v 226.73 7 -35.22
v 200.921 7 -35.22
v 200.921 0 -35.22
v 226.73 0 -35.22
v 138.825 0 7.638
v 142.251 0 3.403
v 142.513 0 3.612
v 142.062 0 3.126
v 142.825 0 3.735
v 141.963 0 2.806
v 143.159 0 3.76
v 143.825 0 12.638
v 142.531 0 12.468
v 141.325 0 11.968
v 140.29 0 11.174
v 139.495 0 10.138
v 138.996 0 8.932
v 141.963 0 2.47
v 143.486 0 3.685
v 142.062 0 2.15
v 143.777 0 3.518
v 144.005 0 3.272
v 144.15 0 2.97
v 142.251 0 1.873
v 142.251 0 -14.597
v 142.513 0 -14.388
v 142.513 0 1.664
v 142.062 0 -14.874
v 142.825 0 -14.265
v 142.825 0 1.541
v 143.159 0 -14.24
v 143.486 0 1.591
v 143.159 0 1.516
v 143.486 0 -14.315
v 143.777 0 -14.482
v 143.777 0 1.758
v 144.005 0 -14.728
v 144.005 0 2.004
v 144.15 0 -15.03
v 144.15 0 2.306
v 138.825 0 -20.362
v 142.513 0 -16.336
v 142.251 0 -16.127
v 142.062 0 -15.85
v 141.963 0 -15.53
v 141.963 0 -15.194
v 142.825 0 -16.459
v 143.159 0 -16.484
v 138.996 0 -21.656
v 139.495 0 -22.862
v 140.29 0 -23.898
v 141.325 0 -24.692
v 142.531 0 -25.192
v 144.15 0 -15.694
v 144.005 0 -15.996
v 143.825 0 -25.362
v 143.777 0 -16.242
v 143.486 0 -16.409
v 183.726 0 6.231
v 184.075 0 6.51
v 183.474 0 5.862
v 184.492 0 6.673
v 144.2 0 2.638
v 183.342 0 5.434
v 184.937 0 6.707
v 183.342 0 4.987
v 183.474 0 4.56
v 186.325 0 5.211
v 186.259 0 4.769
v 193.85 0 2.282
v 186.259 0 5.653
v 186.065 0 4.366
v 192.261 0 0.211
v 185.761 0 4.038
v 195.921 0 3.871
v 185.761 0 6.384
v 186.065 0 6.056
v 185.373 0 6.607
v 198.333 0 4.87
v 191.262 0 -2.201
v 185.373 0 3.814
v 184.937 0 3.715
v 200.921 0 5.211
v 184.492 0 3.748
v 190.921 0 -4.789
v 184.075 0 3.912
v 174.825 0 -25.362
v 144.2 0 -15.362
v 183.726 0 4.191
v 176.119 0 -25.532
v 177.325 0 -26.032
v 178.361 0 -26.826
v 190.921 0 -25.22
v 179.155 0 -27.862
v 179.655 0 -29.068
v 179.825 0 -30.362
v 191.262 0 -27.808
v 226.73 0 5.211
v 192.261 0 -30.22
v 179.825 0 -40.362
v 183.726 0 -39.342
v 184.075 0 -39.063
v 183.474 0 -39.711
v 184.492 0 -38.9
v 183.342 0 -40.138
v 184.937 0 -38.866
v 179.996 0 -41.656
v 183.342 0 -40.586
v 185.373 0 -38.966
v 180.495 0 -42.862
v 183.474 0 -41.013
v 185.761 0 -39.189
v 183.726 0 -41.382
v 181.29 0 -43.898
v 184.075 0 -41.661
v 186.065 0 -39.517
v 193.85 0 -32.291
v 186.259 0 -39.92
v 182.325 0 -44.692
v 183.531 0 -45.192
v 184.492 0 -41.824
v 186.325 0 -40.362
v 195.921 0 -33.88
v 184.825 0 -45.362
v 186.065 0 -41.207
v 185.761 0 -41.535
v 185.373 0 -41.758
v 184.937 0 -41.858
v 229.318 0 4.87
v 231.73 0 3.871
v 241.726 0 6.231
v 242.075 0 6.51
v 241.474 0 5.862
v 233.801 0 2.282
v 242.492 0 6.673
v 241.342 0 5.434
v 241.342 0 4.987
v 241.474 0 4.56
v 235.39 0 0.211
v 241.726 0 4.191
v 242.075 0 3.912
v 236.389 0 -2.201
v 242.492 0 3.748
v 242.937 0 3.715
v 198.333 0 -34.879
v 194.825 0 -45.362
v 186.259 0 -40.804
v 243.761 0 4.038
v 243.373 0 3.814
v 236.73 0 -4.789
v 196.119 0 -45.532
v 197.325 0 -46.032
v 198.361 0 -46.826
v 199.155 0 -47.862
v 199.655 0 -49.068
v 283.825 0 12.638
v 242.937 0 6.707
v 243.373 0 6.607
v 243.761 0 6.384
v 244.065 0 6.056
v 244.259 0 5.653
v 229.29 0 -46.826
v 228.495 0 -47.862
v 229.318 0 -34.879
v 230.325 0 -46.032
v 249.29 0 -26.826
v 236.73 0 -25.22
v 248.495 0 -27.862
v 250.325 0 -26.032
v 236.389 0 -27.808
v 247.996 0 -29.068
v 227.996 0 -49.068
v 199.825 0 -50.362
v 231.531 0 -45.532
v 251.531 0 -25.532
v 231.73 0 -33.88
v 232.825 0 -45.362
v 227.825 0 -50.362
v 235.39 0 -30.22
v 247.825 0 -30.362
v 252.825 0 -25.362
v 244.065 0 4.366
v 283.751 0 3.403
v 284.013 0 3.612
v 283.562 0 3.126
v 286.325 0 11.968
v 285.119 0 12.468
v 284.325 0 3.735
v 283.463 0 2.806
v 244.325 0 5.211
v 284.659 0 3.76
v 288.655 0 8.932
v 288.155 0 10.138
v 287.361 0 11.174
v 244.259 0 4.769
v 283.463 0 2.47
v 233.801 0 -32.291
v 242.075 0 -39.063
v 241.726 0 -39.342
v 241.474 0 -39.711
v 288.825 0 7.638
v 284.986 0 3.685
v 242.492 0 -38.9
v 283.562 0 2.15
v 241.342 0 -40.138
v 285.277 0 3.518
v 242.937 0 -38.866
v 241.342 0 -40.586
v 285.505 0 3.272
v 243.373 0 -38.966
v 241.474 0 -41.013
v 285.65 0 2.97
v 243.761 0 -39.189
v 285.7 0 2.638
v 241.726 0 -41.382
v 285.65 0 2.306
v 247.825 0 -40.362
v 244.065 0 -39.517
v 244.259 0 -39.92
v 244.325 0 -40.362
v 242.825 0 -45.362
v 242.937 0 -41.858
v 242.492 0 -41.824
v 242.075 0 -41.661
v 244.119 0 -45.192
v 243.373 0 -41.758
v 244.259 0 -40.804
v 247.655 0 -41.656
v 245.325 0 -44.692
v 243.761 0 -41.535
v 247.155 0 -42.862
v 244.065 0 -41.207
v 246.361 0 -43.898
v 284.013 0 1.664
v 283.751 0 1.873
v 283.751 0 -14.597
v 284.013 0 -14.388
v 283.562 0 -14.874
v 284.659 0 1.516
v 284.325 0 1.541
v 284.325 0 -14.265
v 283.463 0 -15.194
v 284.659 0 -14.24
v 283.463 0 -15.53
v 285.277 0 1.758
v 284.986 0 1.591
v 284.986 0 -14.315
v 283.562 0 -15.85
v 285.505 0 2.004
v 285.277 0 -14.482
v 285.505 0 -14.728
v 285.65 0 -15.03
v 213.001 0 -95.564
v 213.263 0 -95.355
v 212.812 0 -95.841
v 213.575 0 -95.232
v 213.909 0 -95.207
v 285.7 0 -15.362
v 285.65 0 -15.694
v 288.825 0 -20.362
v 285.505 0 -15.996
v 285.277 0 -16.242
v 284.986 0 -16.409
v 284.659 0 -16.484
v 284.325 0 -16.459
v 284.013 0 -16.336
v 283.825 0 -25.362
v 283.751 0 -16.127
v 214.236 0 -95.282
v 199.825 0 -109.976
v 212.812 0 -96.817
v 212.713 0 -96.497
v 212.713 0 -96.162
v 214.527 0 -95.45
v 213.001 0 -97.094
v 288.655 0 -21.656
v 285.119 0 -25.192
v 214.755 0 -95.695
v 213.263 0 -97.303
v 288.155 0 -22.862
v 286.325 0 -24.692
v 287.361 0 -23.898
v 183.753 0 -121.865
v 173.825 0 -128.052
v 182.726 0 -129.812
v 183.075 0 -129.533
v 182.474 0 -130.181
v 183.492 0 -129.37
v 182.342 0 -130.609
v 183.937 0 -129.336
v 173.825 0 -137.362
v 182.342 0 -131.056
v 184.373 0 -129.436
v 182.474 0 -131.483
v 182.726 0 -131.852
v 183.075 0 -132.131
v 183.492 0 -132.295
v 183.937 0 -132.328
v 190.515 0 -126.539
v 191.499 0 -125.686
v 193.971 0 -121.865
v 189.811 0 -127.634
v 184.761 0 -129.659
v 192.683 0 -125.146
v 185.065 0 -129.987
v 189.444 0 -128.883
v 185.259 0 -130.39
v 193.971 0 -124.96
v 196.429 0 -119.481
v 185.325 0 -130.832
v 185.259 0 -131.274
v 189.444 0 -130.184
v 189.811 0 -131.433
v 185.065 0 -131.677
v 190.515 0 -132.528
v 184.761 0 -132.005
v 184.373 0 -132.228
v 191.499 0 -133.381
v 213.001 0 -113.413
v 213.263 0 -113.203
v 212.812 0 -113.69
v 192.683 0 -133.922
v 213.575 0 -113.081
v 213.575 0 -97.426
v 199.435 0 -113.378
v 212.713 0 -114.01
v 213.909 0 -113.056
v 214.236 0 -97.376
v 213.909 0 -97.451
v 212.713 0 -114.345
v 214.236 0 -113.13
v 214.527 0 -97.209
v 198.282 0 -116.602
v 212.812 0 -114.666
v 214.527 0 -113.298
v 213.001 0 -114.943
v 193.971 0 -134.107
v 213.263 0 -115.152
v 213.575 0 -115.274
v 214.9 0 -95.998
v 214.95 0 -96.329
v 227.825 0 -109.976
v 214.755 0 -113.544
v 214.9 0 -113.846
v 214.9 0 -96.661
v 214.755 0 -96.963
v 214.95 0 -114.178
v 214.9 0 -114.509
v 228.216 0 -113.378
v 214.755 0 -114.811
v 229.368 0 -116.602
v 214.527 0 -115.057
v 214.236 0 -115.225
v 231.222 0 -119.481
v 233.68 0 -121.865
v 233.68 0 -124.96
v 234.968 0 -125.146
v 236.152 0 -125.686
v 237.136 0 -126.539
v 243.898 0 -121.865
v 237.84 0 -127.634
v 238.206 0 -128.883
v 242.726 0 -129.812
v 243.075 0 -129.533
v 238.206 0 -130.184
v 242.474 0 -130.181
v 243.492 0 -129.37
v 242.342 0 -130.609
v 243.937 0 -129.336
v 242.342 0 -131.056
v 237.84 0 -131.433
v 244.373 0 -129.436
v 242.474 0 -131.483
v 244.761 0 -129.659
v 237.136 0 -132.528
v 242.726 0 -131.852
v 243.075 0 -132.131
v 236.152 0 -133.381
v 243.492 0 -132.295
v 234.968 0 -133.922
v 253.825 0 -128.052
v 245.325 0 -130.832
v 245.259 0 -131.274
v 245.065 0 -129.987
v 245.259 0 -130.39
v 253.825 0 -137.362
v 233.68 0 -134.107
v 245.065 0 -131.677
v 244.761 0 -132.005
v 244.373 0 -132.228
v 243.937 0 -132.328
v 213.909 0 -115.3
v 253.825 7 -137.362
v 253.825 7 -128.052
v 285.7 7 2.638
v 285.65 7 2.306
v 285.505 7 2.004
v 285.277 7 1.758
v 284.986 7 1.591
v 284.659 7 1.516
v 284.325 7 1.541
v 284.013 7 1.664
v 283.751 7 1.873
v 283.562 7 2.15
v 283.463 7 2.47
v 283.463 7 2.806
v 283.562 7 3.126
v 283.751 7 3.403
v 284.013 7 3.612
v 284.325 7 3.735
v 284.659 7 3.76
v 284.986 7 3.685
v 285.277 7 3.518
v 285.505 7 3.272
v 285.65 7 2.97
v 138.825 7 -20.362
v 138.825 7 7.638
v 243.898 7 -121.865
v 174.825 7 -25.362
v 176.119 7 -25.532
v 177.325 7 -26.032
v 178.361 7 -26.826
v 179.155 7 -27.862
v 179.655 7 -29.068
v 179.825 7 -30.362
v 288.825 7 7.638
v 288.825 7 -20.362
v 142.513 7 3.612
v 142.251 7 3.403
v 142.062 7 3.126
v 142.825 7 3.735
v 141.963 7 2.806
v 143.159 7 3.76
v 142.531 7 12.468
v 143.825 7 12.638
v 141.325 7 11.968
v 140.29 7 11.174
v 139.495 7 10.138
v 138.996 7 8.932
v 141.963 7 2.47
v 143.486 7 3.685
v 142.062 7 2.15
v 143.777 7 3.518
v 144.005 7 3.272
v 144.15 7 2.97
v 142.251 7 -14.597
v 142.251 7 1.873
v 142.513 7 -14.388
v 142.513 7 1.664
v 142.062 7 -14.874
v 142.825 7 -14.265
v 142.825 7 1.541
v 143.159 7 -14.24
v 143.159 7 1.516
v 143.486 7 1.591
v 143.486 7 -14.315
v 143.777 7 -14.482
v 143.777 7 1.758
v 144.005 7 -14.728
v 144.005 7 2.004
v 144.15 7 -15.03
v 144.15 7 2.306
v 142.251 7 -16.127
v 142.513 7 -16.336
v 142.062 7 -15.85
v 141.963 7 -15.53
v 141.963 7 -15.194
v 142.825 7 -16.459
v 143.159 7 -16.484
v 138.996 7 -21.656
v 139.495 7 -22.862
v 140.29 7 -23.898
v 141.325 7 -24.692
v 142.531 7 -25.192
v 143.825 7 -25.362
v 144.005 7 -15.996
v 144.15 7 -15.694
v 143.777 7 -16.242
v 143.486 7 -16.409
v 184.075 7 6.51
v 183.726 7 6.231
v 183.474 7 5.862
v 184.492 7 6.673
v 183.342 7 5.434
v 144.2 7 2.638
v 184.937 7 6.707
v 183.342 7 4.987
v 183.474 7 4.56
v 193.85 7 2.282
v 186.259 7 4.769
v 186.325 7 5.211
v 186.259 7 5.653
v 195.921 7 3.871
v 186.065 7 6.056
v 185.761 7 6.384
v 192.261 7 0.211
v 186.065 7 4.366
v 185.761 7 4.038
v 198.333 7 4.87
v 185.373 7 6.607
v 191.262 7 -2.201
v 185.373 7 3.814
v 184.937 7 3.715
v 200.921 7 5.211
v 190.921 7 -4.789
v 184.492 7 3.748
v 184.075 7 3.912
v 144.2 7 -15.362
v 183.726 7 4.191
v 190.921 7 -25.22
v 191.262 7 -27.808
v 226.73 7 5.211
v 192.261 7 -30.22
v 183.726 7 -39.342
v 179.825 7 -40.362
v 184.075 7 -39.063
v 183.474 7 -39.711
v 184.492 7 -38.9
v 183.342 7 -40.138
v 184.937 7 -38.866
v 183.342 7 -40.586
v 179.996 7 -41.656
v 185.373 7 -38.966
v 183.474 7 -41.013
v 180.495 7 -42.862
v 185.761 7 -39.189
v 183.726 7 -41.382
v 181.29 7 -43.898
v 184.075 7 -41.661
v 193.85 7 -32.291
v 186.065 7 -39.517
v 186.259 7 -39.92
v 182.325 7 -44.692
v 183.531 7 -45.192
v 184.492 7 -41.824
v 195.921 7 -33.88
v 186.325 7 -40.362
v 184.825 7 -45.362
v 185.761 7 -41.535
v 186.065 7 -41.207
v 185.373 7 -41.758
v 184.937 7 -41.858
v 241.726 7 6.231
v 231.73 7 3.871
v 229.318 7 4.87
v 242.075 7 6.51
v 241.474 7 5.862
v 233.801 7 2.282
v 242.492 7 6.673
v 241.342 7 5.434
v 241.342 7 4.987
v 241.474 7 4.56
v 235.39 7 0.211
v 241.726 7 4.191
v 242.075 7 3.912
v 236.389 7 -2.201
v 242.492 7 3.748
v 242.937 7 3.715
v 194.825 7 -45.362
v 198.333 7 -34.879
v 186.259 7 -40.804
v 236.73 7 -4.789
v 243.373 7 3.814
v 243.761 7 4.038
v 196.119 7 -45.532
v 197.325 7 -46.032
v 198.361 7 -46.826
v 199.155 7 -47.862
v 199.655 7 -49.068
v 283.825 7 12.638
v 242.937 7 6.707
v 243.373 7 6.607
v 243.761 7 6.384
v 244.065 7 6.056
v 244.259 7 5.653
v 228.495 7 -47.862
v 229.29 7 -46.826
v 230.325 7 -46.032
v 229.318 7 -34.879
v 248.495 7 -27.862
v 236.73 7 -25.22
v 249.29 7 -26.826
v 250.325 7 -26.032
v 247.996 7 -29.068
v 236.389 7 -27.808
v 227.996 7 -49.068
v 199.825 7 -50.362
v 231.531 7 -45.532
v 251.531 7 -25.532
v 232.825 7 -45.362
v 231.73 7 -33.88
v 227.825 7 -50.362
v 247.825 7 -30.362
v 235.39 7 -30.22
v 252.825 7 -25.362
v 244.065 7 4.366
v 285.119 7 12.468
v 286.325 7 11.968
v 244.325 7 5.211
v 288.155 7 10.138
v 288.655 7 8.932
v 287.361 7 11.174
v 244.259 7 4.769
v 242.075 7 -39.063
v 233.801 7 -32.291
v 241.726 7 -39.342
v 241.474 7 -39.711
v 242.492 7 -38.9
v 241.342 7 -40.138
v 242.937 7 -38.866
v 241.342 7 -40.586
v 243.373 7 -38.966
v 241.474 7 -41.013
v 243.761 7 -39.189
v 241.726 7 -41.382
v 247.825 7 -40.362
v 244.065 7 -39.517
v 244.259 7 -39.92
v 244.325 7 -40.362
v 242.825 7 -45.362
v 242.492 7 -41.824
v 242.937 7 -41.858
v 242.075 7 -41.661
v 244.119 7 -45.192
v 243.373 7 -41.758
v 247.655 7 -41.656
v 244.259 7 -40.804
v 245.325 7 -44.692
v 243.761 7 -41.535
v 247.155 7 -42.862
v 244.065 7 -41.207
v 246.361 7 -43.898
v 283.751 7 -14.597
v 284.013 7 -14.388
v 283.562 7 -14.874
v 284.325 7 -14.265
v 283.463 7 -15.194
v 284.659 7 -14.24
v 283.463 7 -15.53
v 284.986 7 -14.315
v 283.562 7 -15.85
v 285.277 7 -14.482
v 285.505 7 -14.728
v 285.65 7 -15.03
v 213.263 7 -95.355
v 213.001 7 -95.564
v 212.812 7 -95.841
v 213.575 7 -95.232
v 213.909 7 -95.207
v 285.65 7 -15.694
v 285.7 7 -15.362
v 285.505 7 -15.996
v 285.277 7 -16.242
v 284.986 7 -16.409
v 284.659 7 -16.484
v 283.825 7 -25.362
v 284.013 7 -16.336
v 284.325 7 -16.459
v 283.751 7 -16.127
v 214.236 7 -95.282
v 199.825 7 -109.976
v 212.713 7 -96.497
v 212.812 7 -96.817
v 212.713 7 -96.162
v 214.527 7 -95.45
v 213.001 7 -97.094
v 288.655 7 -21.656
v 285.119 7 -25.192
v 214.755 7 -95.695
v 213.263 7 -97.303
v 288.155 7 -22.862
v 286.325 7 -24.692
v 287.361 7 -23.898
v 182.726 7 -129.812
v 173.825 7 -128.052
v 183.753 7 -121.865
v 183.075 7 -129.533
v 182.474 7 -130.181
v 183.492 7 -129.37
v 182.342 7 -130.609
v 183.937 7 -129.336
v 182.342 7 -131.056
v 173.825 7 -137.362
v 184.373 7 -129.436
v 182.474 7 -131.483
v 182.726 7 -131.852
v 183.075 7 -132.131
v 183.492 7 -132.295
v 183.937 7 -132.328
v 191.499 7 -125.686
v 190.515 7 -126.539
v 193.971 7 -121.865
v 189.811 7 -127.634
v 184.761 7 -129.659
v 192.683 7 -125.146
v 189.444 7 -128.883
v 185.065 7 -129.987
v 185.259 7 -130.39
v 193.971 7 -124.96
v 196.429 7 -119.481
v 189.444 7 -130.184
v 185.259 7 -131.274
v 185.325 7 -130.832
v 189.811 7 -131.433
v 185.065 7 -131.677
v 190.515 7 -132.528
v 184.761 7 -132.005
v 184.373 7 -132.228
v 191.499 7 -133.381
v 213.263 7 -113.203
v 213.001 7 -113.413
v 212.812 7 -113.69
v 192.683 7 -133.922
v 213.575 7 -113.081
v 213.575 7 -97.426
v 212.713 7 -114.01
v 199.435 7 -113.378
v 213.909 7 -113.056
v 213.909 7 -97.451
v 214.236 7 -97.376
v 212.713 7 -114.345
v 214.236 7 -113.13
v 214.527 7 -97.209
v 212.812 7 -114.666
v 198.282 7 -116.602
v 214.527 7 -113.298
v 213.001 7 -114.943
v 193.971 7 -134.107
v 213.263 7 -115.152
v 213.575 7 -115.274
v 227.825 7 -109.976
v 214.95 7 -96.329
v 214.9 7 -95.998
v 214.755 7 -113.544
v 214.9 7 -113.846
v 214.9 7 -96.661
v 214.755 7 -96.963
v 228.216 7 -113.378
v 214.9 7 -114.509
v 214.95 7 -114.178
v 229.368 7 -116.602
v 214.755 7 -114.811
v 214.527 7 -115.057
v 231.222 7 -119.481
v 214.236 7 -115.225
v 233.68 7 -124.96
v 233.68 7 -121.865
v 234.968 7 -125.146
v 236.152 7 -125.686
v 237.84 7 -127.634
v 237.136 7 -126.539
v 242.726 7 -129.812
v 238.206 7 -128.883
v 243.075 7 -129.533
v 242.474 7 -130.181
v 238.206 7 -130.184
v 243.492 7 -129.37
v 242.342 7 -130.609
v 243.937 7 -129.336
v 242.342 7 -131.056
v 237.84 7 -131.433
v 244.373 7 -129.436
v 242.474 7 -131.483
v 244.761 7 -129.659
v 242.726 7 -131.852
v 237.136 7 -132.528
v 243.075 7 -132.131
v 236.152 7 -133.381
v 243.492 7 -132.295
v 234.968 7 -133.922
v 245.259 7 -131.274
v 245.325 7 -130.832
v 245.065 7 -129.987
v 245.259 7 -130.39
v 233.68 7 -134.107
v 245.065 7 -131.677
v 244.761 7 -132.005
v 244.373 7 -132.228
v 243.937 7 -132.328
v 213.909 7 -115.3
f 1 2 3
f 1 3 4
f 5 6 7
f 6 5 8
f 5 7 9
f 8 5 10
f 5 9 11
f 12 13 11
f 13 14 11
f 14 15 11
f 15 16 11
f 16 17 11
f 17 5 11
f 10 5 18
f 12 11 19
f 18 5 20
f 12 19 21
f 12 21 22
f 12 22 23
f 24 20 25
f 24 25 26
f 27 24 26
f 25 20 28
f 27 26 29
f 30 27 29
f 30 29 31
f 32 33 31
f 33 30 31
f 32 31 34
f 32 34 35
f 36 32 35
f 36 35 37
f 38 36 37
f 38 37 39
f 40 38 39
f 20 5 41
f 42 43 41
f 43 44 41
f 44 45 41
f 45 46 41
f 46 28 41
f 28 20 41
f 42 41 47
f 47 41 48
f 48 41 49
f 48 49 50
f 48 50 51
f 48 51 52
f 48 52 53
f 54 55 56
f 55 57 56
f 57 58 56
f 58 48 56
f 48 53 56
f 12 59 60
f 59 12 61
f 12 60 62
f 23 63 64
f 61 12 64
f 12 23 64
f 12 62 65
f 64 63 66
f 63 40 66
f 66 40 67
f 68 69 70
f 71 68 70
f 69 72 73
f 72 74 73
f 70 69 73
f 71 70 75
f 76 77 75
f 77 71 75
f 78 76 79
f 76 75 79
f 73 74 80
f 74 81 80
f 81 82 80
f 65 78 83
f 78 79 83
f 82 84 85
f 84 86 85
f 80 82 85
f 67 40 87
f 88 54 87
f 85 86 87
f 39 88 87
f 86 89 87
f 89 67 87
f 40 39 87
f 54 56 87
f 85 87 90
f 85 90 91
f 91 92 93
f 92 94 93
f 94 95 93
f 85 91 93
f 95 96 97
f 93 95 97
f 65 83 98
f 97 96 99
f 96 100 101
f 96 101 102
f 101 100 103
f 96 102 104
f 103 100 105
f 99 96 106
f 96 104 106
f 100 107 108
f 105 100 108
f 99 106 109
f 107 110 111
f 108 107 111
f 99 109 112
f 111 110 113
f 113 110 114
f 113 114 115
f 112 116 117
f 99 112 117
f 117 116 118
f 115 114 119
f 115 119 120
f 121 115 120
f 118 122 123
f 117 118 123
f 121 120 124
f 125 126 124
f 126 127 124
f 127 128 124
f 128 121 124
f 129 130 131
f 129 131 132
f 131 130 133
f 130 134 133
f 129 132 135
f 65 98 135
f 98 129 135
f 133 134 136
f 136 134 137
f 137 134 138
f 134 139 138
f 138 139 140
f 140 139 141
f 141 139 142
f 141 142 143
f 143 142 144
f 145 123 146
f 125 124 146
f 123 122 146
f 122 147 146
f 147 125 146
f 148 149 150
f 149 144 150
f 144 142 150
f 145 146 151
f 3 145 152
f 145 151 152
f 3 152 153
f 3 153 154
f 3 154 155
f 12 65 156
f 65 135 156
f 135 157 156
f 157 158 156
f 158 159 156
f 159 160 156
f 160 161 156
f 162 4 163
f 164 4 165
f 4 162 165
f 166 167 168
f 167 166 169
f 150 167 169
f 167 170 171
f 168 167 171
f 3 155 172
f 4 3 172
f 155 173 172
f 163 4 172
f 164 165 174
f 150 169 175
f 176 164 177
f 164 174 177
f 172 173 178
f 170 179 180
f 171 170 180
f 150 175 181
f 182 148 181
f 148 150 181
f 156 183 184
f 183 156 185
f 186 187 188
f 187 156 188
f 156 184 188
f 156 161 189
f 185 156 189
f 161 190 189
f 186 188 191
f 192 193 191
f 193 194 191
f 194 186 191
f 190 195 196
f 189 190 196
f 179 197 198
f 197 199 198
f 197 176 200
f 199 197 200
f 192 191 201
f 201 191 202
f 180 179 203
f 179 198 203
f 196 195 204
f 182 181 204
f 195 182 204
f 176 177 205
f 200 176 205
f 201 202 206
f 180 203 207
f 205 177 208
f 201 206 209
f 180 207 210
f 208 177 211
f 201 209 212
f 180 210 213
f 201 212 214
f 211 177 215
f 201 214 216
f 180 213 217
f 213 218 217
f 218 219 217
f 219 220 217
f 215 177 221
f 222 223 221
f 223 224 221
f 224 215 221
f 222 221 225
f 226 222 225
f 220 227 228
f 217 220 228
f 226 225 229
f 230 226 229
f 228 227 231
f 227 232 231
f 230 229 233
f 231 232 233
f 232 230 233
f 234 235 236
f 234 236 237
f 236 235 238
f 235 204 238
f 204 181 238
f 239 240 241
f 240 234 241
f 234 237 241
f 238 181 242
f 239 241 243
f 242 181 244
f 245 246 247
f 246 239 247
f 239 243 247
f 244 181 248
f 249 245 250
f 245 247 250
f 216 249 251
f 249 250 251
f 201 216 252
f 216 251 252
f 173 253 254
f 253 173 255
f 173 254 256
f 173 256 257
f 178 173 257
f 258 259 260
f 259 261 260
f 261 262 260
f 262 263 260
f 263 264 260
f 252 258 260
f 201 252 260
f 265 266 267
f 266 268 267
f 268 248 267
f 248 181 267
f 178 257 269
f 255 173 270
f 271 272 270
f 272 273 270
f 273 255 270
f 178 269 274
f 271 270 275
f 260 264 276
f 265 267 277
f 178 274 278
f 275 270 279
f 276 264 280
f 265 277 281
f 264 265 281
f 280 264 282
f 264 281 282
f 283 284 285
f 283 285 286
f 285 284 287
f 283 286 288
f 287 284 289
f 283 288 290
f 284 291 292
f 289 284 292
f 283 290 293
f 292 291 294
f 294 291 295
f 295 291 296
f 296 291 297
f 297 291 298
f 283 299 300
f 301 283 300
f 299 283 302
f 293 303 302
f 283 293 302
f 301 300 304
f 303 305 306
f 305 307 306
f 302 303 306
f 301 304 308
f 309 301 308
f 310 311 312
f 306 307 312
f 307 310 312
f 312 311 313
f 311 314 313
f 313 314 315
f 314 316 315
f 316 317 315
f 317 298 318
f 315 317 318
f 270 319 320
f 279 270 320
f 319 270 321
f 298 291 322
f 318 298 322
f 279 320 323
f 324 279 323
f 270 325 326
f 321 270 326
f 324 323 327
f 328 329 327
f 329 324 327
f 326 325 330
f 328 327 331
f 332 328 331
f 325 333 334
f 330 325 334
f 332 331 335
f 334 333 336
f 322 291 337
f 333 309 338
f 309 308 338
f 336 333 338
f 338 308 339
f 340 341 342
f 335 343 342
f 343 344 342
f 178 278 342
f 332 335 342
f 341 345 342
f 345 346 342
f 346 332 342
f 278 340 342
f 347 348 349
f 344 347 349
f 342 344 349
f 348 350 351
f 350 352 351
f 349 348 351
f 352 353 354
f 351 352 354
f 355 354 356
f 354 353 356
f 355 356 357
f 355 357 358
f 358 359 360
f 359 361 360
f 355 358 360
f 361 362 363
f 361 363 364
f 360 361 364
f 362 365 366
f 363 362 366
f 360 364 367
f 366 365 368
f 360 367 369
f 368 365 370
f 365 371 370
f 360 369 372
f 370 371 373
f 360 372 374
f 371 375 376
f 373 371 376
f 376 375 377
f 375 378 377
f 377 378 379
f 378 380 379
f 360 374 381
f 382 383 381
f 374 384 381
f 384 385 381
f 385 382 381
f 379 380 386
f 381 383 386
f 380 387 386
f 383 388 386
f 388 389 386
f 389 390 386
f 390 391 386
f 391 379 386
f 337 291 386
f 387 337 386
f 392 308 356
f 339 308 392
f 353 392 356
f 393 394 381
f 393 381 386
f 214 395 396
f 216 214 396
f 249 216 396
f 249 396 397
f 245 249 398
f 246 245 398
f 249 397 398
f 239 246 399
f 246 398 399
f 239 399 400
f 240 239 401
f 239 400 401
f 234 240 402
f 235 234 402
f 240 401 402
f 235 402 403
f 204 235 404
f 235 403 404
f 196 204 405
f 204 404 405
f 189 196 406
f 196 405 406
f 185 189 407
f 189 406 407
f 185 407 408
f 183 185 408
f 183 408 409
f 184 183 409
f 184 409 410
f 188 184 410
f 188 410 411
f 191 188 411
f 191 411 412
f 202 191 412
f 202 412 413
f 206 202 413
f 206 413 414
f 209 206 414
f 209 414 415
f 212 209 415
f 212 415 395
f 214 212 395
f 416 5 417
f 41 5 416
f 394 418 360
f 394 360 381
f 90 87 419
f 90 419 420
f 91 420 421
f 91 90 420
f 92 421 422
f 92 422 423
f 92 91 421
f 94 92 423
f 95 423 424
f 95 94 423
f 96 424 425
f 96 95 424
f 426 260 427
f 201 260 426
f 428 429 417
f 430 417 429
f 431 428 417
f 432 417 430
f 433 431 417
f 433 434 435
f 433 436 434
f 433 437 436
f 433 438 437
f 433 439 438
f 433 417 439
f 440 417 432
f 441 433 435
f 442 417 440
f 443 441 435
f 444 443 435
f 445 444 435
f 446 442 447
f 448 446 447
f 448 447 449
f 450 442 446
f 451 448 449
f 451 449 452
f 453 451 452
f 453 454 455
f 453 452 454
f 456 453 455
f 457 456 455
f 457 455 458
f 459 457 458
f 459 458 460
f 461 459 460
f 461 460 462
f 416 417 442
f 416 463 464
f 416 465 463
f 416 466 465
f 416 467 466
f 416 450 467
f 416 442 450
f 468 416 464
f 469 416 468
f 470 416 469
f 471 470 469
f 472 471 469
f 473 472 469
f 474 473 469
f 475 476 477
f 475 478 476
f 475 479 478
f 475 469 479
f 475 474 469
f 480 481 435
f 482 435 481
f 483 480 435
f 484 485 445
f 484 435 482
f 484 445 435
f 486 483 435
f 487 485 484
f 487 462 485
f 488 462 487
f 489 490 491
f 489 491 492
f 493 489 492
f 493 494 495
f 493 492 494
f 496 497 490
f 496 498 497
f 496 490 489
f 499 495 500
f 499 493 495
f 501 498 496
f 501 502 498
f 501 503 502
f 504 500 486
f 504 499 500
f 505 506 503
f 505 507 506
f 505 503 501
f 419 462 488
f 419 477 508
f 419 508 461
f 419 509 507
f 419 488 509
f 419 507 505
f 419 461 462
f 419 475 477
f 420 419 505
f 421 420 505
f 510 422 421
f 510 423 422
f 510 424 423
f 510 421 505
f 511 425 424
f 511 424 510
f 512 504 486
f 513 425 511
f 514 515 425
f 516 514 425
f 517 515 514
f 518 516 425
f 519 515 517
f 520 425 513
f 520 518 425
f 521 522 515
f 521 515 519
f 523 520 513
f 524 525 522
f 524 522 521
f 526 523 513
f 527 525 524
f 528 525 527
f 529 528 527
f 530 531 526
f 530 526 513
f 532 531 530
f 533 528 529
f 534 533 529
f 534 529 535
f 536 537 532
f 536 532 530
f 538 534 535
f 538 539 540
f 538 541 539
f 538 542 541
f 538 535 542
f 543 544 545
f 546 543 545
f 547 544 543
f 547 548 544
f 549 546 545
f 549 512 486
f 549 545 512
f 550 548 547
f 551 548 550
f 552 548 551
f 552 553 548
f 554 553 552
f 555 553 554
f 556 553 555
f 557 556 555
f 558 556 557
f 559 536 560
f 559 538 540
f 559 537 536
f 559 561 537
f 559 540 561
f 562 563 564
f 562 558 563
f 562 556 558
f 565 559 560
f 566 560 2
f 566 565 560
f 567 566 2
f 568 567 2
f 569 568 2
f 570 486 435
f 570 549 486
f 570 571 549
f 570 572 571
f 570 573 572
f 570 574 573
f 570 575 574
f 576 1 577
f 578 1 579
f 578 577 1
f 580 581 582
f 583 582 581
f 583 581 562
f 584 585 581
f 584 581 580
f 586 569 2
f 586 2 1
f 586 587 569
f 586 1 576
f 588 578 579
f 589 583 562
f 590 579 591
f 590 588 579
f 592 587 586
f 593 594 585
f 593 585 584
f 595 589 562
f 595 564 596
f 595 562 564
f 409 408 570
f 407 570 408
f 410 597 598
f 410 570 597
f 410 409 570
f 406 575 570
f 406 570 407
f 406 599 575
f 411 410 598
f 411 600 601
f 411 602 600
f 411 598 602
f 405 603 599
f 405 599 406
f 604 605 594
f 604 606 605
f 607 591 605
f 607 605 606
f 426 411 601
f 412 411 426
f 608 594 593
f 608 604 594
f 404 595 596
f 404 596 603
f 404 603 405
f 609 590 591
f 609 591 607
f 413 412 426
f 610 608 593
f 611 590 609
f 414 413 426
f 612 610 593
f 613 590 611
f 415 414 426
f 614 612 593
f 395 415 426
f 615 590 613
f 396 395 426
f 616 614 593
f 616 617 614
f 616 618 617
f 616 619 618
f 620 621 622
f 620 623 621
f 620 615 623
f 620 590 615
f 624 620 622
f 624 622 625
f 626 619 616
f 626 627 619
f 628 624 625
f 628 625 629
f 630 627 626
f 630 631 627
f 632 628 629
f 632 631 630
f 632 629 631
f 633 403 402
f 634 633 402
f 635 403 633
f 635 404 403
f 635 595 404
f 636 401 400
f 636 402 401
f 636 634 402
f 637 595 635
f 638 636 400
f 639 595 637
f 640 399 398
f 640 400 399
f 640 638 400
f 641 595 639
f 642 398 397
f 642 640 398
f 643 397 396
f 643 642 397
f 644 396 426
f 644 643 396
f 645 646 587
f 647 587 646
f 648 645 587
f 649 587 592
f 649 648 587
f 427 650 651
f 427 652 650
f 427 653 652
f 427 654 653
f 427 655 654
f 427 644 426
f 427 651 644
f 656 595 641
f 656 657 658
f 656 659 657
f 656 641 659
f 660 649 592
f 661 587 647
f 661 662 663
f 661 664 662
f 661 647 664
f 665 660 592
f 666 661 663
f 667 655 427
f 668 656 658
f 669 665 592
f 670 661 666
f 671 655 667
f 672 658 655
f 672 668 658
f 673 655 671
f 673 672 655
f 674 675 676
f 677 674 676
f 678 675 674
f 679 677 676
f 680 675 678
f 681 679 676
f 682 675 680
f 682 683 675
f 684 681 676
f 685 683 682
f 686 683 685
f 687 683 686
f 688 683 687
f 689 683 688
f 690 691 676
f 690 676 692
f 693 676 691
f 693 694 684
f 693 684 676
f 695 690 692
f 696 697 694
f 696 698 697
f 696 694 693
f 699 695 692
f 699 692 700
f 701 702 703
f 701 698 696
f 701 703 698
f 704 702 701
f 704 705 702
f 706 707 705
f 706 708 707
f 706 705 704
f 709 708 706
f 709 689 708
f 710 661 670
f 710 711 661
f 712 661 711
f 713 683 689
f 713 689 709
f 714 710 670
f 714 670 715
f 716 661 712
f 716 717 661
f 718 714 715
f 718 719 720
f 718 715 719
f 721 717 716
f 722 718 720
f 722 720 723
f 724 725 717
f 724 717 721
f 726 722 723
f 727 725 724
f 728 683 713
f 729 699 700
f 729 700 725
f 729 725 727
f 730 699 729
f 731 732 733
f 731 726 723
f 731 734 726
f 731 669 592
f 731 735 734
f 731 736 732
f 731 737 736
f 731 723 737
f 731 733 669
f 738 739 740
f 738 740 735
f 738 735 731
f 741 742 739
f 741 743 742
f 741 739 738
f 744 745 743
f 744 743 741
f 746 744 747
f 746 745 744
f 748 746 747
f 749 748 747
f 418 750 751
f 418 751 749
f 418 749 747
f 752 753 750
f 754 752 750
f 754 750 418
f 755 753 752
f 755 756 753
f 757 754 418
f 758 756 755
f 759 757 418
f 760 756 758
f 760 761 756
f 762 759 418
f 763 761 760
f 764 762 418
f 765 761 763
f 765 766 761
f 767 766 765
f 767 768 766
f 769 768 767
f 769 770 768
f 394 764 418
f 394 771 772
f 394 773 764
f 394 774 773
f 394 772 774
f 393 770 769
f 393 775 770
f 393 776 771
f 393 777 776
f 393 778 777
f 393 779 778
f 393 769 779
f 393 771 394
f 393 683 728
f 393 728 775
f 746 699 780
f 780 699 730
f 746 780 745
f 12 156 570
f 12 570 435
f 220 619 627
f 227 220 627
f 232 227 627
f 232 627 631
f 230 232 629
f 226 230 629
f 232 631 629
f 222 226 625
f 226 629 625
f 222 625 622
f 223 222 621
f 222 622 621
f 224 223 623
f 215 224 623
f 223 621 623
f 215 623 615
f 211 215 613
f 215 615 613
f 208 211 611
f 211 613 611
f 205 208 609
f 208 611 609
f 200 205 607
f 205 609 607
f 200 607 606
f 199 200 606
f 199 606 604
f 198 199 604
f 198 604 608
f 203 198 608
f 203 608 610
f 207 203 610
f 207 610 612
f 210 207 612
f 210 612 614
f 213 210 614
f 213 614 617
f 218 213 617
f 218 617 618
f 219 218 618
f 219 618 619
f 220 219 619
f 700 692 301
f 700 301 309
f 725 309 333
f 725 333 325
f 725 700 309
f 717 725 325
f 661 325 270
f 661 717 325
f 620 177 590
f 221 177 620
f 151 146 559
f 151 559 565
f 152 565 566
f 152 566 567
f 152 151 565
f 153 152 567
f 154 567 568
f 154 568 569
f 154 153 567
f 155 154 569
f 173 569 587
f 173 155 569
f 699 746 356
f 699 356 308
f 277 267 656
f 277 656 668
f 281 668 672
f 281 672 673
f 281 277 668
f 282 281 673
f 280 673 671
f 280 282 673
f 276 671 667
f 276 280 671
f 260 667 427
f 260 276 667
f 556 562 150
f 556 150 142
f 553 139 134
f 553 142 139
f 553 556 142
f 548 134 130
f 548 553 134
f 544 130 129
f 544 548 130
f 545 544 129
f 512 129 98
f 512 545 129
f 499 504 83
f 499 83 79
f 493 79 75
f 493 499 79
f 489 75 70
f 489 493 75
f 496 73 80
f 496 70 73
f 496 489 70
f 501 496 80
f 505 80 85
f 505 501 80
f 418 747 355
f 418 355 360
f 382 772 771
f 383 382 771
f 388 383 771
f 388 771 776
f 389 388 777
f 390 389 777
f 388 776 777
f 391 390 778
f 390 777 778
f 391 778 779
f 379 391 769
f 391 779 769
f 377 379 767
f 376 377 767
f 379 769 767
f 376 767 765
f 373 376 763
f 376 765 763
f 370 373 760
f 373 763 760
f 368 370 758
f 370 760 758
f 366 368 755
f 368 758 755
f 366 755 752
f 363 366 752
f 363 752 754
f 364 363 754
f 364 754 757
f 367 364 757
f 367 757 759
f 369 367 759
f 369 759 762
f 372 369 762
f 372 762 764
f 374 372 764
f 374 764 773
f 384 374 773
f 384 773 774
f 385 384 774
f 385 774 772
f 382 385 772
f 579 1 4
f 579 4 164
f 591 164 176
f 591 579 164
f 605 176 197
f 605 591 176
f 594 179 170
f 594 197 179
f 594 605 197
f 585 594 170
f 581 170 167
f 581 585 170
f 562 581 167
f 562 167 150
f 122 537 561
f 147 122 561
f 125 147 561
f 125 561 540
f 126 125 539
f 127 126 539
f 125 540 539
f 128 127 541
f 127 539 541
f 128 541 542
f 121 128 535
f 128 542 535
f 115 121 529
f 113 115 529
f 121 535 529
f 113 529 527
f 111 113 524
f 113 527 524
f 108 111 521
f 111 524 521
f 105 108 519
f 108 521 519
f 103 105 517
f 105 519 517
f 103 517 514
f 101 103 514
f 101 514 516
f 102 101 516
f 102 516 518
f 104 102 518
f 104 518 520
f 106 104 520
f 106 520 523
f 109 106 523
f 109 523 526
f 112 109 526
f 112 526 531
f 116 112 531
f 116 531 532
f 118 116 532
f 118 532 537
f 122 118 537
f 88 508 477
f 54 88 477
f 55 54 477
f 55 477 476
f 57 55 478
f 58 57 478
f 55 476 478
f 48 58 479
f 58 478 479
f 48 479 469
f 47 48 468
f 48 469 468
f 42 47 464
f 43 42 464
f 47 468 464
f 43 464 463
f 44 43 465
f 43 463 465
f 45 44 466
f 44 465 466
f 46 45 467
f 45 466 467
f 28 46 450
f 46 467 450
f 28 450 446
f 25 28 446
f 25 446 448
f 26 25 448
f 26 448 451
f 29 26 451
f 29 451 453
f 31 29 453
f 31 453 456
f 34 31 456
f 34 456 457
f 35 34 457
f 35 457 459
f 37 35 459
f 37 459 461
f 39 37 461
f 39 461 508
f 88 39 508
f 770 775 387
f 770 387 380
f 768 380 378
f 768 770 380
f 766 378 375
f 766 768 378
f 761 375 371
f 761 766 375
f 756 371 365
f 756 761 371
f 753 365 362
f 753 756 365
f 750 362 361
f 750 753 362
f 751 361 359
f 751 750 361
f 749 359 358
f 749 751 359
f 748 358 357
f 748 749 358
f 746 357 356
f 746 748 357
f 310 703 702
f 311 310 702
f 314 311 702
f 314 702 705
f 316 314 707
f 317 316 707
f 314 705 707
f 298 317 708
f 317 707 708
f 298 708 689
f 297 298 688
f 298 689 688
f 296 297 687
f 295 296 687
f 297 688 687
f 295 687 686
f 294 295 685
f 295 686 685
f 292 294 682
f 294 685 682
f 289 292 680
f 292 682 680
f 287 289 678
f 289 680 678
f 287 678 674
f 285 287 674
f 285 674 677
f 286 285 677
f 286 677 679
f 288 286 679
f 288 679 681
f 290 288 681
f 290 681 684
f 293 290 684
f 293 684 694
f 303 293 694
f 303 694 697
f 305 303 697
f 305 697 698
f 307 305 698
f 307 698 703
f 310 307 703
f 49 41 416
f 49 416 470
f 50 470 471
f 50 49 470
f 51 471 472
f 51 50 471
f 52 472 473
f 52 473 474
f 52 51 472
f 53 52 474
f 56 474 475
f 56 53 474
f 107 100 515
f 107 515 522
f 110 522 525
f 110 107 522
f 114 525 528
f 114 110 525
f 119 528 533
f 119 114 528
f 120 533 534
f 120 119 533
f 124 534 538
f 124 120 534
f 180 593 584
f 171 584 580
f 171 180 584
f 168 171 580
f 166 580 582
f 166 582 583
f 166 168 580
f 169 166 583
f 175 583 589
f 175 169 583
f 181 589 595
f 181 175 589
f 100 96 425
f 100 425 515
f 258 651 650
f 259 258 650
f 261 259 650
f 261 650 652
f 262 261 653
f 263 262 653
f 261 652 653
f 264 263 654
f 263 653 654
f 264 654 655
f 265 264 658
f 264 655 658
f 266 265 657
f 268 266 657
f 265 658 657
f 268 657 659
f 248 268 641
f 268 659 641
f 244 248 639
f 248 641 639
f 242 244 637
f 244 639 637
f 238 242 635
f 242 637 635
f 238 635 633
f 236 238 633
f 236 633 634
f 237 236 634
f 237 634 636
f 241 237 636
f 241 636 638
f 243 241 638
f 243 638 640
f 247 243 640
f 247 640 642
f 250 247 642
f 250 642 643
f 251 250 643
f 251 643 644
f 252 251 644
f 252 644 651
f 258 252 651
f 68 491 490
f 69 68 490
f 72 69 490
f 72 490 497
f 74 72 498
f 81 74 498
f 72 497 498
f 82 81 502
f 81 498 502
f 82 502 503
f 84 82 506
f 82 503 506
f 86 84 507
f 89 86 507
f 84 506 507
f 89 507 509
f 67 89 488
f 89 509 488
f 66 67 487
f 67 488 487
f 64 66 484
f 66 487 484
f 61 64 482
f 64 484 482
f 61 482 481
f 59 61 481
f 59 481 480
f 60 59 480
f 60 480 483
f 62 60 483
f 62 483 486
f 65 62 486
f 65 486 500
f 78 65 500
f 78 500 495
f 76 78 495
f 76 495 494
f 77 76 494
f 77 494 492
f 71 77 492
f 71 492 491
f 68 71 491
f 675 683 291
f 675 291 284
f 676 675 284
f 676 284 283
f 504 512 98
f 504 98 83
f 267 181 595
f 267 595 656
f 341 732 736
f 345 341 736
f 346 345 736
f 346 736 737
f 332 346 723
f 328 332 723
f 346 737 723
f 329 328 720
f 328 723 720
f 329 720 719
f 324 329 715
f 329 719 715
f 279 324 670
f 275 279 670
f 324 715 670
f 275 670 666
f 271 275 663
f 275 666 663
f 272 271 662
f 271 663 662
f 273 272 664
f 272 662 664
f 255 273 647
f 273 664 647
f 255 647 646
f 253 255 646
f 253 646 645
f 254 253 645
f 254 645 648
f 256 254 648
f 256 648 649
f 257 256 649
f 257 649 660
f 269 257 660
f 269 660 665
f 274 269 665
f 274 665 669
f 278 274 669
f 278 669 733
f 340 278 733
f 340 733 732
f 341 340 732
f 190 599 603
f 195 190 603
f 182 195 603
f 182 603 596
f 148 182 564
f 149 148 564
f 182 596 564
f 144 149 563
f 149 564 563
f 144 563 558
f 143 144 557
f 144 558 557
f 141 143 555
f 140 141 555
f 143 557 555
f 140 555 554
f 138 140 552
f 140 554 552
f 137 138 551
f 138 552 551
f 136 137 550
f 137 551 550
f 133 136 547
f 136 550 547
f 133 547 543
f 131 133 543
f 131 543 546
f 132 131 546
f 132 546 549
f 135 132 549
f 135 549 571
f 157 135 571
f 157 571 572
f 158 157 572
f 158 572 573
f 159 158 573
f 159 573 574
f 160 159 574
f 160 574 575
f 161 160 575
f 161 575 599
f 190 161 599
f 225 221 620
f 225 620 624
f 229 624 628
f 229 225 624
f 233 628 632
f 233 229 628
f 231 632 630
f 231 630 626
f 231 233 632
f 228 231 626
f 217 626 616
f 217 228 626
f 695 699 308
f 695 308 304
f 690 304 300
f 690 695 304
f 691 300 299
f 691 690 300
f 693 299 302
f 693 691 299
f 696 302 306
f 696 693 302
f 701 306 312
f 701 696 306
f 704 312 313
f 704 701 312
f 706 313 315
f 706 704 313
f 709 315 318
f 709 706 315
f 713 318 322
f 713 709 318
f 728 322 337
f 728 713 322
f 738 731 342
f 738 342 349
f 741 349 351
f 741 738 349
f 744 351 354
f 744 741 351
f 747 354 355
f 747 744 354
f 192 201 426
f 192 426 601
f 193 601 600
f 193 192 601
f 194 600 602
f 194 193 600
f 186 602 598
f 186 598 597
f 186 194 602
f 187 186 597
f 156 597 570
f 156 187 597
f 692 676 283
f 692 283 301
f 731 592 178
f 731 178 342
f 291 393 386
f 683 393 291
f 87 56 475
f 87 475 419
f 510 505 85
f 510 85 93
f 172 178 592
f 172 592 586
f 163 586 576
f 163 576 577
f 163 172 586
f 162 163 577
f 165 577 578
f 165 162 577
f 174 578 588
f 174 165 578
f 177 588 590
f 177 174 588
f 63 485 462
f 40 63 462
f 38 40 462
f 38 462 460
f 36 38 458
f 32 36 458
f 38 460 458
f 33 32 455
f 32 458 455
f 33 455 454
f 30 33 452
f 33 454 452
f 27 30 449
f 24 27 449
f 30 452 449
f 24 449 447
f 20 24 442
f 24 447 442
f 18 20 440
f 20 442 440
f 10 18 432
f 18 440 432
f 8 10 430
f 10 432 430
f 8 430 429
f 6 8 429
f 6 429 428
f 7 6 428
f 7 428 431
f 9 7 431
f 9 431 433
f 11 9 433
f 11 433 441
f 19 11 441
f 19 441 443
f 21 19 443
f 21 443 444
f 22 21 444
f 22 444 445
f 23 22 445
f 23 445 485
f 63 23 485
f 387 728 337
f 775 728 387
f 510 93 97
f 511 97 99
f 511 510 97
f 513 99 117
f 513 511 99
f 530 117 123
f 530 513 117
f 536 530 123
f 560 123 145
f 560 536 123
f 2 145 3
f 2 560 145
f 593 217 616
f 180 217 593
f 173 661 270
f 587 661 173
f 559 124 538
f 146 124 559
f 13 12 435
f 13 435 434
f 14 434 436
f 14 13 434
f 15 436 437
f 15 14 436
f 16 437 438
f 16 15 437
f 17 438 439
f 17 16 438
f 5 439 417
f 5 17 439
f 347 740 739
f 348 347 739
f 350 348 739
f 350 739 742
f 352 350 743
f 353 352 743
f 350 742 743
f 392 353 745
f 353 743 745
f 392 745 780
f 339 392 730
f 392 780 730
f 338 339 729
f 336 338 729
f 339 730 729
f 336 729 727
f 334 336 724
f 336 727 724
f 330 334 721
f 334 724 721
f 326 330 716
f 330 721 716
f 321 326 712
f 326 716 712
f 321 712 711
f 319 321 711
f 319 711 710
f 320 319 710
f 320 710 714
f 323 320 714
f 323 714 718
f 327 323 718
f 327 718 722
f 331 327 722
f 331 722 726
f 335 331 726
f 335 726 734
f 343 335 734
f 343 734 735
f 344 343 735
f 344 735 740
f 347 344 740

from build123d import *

# Parameters (mm, degrees)
BOSS_EXTRUDE3_DEPTH     = 7
CUT_EXTRUDE1_DEPTH      = 10
SKETCH3_R               = 1.125
CUT_EXTRUDE3_DEPTH      = 1
CUT_EXTRUDE3_DEPTH_BACK = 8
SKETCH4_R               = 1.5
BOSS_EXTRUDE4_DEPTH     = 7
SKETCH5_R               = 1.5
CUT_EXTRUDE4_DEPTH      = 1
CUT_EXTRUDE4_DEPTH_BACK = 8
SKETCH6_R               = 1.125
CUT_EXTRUDE5_DEPTH      = 1
CUT_EXTRUDE5_DEPTH_BACK = 8
CUT_EXTRUDE6_DEPTH      = 1
CUT_EXTRUDE6_DEPTH_BACK = 8


with BuildPart() as part:
    # Sketch1 → Boss-Extrude3 (new body)
    with BuildSketch(Plane(origin=(0, 0, 0), x_dir=(1, 0, 0), z_dir=(0, 1, 0))):
        with BuildLine():
            Line((283.825365173, -12.637997433), (247.825365173, -12.637997433))
            Line((247.825365173, -12.637997433), (247.825365173, -17.637997433))
            ThreePointArc((247.825365173, -17.637997433), (246.360899079, -21.173531339), (242.825365173, -22.637997433))
            Line((242.825365173, -22.637997433), (184.825365173, -22.637997433))
            ThreePointArc((184.825365173, -22.637997433), (181.289831267, -21.173531339), (179.825365173, -17.637997433))
            Line((179.825365173, -17.637997433), (179.825365173, -12.637997433))
            Line((179.825365173, -12.637997433), (143.825365173, -12.637997433))
            ThreePointArc((143.825365173, -12.637997433), (140.289831267, -11.173531339), (138.825365173, -7.637997433))
            Line((138.825365173, -7.637997433), (138.825365173, 20.362002567))
            ThreePointArc((138.825365173, 20.362002567), (140.289831267, 23.897536473), (143.825365173, 25.362002567))
            Line((143.825365173, 25.362002567), (174.825365173, 25.362002567))
            ThreePointArc((174.825365173, 25.362002567), (178.360899079, 26.826468661), (179.825365173, 30.362002567))
            Line((179.825365173, 30.362002567), (179.825365173, 40.362002567))
            ThreePointArc((179.825365173, 40.362002567), (181.289831267, 43.897536473), (184.825365173, 45.362002567))
            Line((184.825365173, 45.362002567), (194.825365173, 45.362002567))
            ThreePointArc((194.825365173, 45.362002567), (198.360899079, 46.826468661), (199.825365173, 50.362002567))
            Line((199.825365173, 50.362002567), (199.825365173, 117.362002567))
            ThreePointArc((199.825365173, 117.362002567), (198.360899079, 120.897536473), (194.825365173, 122.362002567))
            Line((194.825365173, 122.362002567), (184.825365173, 122.362002567))
            ThreePointArc((184.825365173, 122.362002567), (181.289831267, 123.826468661), (179.825365173, 127.362002567))
            Line((179.825365173, 127.362002567), (179.825365173, 132.362002567))
            ThreePointArc((179.825365173, 132.362002567), (181.289831267, 135.897536473), (184.825365173, 137.362002567))
            Line((184.825365173, 137.362002567), (242.825365173, 137.362002567))
            ThreePointArc((242.825365173, 137.362002567), (246.360899079, 135.897536473), (247.825365173, 132.362002567))
            Line((247.825365173, 132.362002567), (247.825365173, 127.362002567))
            ThreePointArc((247.825365173, 127.362002567), (246.360899079, 123.826468661), (242.825365173, 122.362002567))
            Line((242.825365173, 122.362002567), (232.825365173, 122.362002567))
            ThreePointArc((232.825365173, 122.362002567), (229.289831267, 120.897536473), (227.825365173, 117.362002567))
            Line((227.825365173, 117.362002567), (227.825365173, 50.362002567))
            ThreePointArc((227.825365173, 50.362002567), (229.289831267, 46.826468661), (232.825365173, 45.362002567))
            Line((232.825365173, 45.362002567), (242.825365173, 45.362002567))
            ThreePointArc((242.825365173, 45.362002567), (246.360899079, 43.897536473), (247.825365173, 40.362002567))
            Line((247.825365173, 40.362002567), (247.825365173, 30.362002567))
            ThreePointArc((247.825365173, 30.362002567), (249.289831267, 26.826468661), (252.825365173, 25.362002567))
            Line((252.825365173, 25.362002567), (283.825365173, 25.362002567))
            ThreePointArc((283.825365173, 25.362002567), (287.360899079, 23.897536473), (288.825365173, 20.362002567))
            Line((288.825365173, 20.362002567), (288.825365173, -7.637997433))
            ThreePointArc((288.825365173, -7.637997433), (287.360899079, -11.173531339), (283.825365173, -12.637997433))
        make_face()
    extrude(amount=BOSS_EXTRUDE3_DEPTH)

    # Sketch2 → Cut-Extrude1 (cut)
    with BuildSketch(Plane(origin=(0, 7, 0), x_dir=(1, 0, 0), z_dir=(0, 1, 0))):
        with BuildLine():
            Line((179.825365173, -12.637997433), (247.825365173, -12.637997433))
            Line((247.825365173, -12.637997433), (247.825365173, -17.637997433))
            ThreePointArc((247.825365173, -17.637997433), (246.360899079, -21.173531339), (242.825365173, -22.637997433))
            Line((242.825365173, -22.637997433), (184.825365173, -22.637997433))
            ThreePointArc((184.825365173, -22.637997433), (181.289831267, -21.173531339), (179.825365173, -17.637997433))
            Line((179.825365173, -17.637997433), (179.825365173, -12.637997433))
        make_face()
    extrude(amount=-CUT_EXTRUDE1_DEPTH, mode=Mode.SUBTRACT)

    # Sketch3 → Cut-Extrude3 (cut, two sides)
    with BuildSketch(Plane(origin=(0, 7, 0), x_dir=(1, 0, 0), z_dir=(0, 1, 0))) as cut_extrude3_sk:
        with Locations((143.075365173, 15.362002567)):
            Circle(SKETCH3_R)
        with Locations((143.075365173, -2.637997433)):
            Circle(SKETCH3_R)
        with Locations((284.575365173, -2.637997433)):
            Circle(SKETCH3_R)
        with Locations((284.575365173, 15.362002567)):
            Circle(SKETCH3_R)
        with BuildLine():
            Line((236.729776069, 25.219549299), (236.729776069, 4.789235296))
            ThreePointArc((236.729776069, 4.789235296), (233.800843881, -2.281832516), (226.729776069, -5.210764704))
            Line((226.729776069, -5.210764704), (200.920954278, -5.210764704))
            ThreePointArc((200.920954278, -5.210764704), (193.849886466, -2.281832516), (190.920954278, 4.789235296))
            Line((190.920954278, 4.789235296), (190.920954278, 25.219549299))
            ThreePointArc((190.920954278, 25.219549299), (193.849886466, 32.290617111), (200.920954278, 35.219549299))
            Line((200.920954278, 35.219549299), (226.729776069, 35.219549299))
            ThreePointArc((226.729776069, 35.219549299), (233.800843881, 32.290617111), (236.729776069, 25.219549299))
        make_face()
    extrude(amount=CUT_EXTRUDE3_DEPTH, mode=Mode.SUBTRACT)
    extrude(cut_extrude3_sk.sketch, amount=-CUT_EXTRUDE3_DEPTH_BACK, mode=Mode.SUBTRACT)

    # Sketch4 → Boss-Extrude4 (add)
    with BuildSketch(Plane(origin=(0, 7, 0), x_dir=(1, 0, 0), z_dir=(0, 1, 0))):
        with BuildLine():
            Line((233.679703761, 121.865339942), (243.89819588, 121.865339942))
            Line((243.89819588, 121.865339942), (253.825365173, 128.052186148))
            Line((253.825365173, 128.052186148), (253.825365173, 137.362002567))
            Line((253.825365173, 137.362002567), (173.825365173, 137.362002567))
            Line((173.825365173, 137.362002567), (173.825365173, 128.052186148))
            Line((173.825365173, 128.052186148), (183.752534467, 121.865339942))
            Line((183.752534467, 121.865339942), (193.971026586, 121.865339942))
            ThreePointArc((193.971026586, 121.865339942), (198.282425053, 116.602256541), (199.825365173, 109.975980106))
            Line((199.825365173, 109.975980106), (199.825365173, 83.862002567))
            Line((199.825365173, 83.862002567), (227.825365173, 83.862002567))
            Line((227.825365173, 83.862002567), (227.825365173, 109.975980106))
            ThreePointArc((227.825365173, 109.975980106), (229.368305294, 116.602256541), (233.679703761, 121.865339942))
        make_face()
        with Locations((183.89819588, 129.862002567)):
            Circle(SKETCH4_R, mode=Mode.SUBTRACT)
        with Locations((243.89819588, 129.862002567)):
            Circle(SKETCH4_R, mode=Mode.SUBTRACT)
    extrude(amount=-BOSS_EXTRUDE4_DEPTH)

    # Sketch5 → Cut-Extrude4 (cut, two sides)
    with BuildSketch(Plane(origin=(0, 7, 0), x_dir=(1, 0, 0), z_dir=(0, 1, 0))) as cut_extrude4_sk:
        with Locations((183.825365173, 130.832171384)):
            Circle(SKETCH5_R)
        with Locations((243.825365173, 130.832171384)):
            Circle(SKETCH5_R)
        with Locations((242.825365173, 40.362002567)):
            Circle(SKETCH5_R)
        with Locations((184.825365173, 40.362002567)):
            Circle(SKETCH5_R)
        with Locations((184.825365173, -5.210764704)):
            Circle(SKETCH5_R)
        with Locations((242.825365173, -5.210764704)):
            Circle(SKETCH5_R)
    extrude(amount=CUT_EXTRUDE4_DEPTH, mode=Mode.SUBTRACT)
    extrude(cut_extrude4_sk.sketch, amount=-CUT_EXTRUDE4_DEPTH_BACK, mode=Mode.SUBTRACT)

    # Sketch6 → Cut-Extrude5 (cut, two sides)
    with BuildSketch(Plane(origin=(0, 7, 0), x_dir=(1, 0, 0), z_dir=(0, 1, 0))) as cut_extrude5_sk:
        with Locations((284.575365173, 15.362002567)):
            Circle(SKETCH6_R)
        with Locations((213.825365173, 96.329183022)):
            Circle(SKETCH6_R)
        with Locations((213.825365173, 114.177699089)):
            Circle(SKETCH6_R)
    extrude(amount=CUT_EXTRUDE5_DEPTH, mode=Mode.SUBTRACT)
    extrude(cut_extrude5_sk.sketch, amount=-CUT_EXTRUDE5_DEPTH_BACK, mode=Mode.SUBTRACT)

    # Sketch7 → Cut-Extrude6 (cut, two sides)
    with BuildSketch(Plane(origin=(0, 7, 0), x_dir=(1, 0, 0), z_dir=(0, 1, 0))) as cut_extrude6_sk:
        with BuildLine():
            Line((193.971026586, 134.106855399), (233.679703761, 134.106855399))
            ThreePointArc((233.679703761, 134.106855399), (238.2529795, 129.533579659), (233.679703761, 124.96030392))
            Line((233.679703761, 124.96030392), (193.971026586, 124.96030392))
            ThreePointArc((193.971026586, 124.96030392), (189.397750847, 129.533579659), (193.971026586, 134.106855399))
        make_face()
    extrude(amount=CUT_EXTRUDE6_DEPTH, mode=Mode.SUBTRACT)
    extrude(cut_extrude6_sk.sketch, amount=-CUT_EXTRUDE6_DEPTH_BACK, mode=Mode.SUBTRACT)


solid = part.part
